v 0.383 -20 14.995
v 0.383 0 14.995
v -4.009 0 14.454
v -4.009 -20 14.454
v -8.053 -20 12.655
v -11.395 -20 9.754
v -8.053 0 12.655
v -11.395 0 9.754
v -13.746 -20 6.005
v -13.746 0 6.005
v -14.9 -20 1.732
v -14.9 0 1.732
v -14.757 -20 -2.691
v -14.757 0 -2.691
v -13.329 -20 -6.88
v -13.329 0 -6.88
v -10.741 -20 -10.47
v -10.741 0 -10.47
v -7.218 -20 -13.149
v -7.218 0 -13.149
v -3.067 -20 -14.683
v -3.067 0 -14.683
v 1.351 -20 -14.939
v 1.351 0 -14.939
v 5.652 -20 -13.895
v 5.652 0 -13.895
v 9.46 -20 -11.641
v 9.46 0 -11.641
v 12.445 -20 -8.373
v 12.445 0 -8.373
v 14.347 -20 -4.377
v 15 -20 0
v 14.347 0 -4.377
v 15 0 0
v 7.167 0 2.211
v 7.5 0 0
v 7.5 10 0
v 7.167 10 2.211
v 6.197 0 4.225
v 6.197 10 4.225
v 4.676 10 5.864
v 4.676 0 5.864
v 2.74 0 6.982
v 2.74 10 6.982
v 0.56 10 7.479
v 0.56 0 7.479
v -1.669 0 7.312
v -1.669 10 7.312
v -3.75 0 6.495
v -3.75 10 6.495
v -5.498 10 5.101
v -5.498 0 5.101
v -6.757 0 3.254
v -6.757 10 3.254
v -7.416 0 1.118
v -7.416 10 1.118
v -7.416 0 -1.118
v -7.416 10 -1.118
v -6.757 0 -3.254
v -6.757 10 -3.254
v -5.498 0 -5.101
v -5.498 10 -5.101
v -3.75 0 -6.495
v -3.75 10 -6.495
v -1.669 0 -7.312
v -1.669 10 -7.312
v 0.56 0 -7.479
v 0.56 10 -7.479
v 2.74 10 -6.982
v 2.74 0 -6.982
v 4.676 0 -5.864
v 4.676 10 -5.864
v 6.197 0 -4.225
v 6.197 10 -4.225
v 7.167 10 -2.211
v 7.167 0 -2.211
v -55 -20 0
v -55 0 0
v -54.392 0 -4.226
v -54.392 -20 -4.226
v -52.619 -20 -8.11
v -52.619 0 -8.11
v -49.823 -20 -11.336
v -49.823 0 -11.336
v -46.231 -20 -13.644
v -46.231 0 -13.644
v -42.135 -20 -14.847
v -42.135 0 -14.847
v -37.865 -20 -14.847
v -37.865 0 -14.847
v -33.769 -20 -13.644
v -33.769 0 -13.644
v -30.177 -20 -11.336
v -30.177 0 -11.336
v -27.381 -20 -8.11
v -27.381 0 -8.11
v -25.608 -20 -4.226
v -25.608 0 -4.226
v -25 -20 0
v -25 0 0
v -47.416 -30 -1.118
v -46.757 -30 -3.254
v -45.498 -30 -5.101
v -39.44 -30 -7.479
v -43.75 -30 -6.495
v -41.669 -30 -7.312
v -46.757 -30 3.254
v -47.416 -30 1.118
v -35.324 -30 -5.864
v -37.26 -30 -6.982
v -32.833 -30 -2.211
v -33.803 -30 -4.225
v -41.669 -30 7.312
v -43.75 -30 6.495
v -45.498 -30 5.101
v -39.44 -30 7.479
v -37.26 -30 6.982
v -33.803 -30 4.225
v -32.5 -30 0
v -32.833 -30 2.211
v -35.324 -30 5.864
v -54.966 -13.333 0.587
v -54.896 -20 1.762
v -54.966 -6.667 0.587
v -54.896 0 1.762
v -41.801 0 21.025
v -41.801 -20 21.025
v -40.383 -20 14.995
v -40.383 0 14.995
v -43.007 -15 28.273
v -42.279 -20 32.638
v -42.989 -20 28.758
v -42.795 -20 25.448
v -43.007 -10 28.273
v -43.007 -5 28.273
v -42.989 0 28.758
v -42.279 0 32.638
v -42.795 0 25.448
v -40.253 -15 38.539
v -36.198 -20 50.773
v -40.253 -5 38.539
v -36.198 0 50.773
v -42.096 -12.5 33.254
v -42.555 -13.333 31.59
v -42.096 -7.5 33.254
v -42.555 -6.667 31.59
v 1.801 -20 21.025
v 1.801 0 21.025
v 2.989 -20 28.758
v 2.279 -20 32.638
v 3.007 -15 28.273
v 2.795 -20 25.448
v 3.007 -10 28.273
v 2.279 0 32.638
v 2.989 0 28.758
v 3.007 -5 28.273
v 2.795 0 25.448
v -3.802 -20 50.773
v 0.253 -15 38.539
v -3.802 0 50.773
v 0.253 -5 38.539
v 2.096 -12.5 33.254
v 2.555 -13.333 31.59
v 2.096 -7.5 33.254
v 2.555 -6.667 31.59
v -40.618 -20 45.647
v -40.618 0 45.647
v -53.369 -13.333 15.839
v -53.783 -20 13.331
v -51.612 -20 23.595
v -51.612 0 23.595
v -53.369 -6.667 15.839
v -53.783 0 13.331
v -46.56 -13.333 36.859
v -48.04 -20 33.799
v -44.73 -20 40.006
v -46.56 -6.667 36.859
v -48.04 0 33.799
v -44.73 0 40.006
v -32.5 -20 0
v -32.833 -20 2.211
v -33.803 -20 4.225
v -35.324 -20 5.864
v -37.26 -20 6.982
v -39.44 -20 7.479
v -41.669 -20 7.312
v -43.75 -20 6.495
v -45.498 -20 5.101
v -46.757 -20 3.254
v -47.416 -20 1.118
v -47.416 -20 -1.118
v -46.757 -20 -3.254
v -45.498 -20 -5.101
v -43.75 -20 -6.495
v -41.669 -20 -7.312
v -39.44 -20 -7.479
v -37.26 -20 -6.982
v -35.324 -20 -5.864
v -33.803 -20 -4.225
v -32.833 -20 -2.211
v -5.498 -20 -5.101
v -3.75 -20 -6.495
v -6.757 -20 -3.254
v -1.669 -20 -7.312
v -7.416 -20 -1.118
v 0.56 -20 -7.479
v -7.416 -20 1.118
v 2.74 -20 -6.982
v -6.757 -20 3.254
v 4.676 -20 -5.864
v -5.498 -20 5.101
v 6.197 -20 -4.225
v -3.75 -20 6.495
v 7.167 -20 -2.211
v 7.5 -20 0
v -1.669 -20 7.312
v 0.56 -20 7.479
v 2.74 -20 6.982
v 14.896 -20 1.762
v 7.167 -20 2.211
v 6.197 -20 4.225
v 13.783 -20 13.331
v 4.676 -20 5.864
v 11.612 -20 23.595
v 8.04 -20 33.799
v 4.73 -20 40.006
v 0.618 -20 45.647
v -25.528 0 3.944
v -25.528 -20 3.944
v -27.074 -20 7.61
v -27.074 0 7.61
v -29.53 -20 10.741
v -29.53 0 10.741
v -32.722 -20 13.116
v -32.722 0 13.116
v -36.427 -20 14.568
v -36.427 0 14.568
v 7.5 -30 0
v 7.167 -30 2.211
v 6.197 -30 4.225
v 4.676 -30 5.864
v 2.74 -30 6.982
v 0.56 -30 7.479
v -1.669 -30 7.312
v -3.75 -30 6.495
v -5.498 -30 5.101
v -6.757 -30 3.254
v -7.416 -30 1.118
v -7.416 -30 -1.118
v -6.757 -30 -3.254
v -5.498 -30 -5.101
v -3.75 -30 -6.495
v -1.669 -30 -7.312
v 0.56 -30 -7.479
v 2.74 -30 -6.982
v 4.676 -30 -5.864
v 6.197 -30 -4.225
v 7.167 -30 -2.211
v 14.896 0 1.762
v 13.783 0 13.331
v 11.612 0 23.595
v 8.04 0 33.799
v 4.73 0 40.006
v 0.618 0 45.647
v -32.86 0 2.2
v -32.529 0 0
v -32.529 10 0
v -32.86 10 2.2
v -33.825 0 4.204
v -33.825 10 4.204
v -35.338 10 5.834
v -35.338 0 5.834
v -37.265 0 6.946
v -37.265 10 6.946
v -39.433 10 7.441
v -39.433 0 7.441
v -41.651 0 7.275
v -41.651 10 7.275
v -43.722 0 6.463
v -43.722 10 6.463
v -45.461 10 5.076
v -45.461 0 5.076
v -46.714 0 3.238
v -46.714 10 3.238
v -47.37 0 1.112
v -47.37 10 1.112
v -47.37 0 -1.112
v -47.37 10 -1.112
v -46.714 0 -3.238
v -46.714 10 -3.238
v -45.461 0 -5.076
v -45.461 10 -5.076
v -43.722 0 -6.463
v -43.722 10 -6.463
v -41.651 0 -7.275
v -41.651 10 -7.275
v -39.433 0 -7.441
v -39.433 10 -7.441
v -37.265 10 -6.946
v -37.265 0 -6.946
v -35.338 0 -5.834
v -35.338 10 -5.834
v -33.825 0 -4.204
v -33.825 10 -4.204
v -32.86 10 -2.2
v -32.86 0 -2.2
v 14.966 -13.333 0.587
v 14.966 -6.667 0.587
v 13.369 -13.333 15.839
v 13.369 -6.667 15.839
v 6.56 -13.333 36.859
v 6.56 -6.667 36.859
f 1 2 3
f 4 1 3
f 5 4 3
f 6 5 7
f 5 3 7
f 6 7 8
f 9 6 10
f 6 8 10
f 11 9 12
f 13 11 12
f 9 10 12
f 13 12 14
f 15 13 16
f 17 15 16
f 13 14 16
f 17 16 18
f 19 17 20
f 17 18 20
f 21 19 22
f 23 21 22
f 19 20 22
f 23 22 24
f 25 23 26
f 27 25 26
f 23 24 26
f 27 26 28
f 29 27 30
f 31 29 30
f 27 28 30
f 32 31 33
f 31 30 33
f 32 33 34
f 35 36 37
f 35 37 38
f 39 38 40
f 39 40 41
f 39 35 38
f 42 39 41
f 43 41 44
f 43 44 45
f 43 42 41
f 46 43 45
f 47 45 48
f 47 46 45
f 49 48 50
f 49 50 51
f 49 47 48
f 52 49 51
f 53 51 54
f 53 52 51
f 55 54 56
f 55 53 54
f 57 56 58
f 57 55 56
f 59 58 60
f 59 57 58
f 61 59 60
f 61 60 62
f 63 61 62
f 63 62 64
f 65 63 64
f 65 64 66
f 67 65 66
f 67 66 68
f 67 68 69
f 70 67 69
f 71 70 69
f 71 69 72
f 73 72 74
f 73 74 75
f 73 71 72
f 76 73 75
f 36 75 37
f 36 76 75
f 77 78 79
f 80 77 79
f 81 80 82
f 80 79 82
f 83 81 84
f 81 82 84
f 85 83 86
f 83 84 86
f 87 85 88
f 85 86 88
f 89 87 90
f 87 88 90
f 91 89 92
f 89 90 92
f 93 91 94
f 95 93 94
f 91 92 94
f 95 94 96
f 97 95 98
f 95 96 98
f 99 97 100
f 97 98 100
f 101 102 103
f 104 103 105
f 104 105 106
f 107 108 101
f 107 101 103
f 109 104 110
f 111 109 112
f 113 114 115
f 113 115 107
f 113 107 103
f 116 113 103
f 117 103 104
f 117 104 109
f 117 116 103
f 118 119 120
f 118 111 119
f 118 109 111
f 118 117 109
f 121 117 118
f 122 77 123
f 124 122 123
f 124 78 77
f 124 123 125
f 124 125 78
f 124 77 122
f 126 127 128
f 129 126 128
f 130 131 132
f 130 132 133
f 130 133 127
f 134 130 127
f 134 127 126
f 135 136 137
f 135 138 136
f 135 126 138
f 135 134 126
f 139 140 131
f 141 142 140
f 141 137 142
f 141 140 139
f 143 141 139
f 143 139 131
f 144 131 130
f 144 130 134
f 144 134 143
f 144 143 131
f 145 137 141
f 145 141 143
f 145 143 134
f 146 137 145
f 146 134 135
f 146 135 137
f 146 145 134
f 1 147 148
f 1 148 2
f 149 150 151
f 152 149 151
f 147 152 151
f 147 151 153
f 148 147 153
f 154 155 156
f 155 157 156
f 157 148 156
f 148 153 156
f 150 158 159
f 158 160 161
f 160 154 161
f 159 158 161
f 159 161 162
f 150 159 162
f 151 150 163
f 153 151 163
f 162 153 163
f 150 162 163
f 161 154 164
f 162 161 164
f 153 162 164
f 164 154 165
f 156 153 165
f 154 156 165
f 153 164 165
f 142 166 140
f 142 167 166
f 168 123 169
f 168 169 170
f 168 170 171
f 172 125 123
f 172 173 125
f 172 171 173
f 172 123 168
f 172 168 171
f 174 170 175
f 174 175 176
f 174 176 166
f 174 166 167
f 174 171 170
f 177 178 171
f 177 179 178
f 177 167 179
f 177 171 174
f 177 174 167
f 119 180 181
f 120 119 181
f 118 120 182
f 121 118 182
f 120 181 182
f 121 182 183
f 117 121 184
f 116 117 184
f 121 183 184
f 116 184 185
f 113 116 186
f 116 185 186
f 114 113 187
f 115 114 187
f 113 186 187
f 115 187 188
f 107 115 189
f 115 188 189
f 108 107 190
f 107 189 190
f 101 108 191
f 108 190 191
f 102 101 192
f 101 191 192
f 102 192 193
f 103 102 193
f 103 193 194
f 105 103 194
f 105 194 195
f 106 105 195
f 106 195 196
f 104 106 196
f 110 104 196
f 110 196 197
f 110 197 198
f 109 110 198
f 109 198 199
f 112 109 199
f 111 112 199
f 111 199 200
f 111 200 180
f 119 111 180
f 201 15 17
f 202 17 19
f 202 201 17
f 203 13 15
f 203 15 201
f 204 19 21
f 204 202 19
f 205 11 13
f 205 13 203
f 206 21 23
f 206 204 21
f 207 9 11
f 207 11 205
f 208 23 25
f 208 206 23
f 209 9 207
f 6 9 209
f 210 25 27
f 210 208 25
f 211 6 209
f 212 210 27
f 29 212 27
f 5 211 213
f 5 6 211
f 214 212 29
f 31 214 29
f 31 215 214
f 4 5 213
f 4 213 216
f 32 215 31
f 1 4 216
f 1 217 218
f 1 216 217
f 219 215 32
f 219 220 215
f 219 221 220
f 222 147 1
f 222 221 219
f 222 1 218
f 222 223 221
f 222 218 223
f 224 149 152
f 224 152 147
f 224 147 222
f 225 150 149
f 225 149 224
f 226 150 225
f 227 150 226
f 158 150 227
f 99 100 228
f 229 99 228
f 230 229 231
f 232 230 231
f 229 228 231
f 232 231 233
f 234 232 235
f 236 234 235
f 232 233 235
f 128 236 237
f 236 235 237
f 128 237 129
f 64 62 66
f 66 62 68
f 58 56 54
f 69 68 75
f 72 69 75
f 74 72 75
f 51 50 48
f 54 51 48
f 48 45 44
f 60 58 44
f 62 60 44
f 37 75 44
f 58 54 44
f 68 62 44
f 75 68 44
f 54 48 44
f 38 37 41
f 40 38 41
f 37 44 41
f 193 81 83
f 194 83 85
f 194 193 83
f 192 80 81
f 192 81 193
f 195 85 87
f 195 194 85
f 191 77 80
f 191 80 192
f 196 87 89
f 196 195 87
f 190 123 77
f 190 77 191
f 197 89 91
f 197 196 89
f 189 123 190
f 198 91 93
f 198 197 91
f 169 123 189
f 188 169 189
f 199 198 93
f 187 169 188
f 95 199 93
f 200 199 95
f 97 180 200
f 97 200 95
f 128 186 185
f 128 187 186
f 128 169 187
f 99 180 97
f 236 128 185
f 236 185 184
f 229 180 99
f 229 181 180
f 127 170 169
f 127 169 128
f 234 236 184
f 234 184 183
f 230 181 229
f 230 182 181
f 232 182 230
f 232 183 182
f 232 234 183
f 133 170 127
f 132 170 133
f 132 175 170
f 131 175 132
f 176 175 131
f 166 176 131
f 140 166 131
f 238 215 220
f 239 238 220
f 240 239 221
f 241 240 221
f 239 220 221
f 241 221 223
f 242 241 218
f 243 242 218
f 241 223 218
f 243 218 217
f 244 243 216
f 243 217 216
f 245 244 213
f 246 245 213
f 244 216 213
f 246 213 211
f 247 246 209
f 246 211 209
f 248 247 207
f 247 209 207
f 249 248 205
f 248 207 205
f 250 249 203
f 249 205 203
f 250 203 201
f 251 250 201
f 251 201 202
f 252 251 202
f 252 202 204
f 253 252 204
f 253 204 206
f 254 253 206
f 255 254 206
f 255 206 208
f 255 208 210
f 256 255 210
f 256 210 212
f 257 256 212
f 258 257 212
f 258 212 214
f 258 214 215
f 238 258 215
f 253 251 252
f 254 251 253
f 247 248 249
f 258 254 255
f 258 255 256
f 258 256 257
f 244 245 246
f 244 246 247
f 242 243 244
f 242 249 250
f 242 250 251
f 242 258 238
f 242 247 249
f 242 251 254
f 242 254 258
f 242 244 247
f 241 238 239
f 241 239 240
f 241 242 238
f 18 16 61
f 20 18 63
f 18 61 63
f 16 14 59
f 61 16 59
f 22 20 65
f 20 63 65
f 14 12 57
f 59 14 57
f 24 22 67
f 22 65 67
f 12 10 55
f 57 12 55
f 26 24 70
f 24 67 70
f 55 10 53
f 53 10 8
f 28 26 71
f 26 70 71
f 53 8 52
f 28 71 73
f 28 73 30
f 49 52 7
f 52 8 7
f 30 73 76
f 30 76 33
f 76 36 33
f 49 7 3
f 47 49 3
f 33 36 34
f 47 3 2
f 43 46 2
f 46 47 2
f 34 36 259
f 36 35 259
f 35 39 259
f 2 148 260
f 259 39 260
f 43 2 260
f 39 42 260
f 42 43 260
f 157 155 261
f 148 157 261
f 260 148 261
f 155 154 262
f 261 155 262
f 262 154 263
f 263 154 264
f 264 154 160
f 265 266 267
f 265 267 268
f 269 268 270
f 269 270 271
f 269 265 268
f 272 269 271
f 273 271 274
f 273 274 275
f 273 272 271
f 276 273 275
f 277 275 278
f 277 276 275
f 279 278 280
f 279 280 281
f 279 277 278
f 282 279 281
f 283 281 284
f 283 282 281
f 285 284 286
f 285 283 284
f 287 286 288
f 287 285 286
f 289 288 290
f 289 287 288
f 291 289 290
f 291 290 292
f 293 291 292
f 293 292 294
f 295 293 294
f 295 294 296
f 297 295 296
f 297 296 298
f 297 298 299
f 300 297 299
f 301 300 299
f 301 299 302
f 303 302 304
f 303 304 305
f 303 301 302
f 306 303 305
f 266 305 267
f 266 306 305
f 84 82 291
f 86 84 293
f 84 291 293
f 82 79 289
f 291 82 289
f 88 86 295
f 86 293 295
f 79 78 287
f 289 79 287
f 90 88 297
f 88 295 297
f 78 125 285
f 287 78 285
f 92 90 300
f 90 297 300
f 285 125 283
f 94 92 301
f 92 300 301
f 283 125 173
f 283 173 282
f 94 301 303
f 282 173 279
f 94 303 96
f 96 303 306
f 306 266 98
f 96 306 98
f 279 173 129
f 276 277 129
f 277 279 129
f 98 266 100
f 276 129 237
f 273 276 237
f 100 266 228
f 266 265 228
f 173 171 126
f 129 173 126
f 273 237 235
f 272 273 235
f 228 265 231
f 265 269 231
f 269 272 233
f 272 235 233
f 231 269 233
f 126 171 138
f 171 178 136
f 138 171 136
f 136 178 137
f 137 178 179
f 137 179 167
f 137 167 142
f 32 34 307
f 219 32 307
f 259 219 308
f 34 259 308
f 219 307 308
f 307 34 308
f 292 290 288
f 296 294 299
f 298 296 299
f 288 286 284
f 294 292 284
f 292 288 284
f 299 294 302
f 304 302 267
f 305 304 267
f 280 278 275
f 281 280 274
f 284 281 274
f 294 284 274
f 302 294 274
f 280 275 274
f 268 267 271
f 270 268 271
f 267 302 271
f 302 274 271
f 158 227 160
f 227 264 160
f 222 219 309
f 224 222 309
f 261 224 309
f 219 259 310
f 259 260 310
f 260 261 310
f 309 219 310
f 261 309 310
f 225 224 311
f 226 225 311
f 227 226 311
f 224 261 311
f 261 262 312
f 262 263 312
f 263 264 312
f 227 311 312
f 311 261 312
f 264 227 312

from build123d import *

# Parameters (mm, degrees)
F0_R          = 7.5
F1_DEPTH      = 20
F3_DEPTH      = 30
F2_R          = 7.4623374199
F4_DEPTH      = 25
F4_DEPTH_BACK = 10
F5_DEPTH      = 30
F6_DEPTH      = 25
F6_DEPTH_BACK = 10


with BuildPart() as f1:
    # F0 (on Front) → F1 (new body)
    with BuildSketch(Plane.XZ):
        with BuildLine():
            ThreePointArc((-54.8961763386, 1.7617975164), (-50.1065741182, 11.0840948929), (-40.3829191544, 14.9951116342))
            add(Edge.make_bspline(
                [(-36.1976698041, 50.7730282843), (-37.7009093441, 46.1154933355), (-40.4381626311, 37.6342591201), (-44.0181723105, 28.6082070233), (-41.4534466343, 20.0703507947), (-40.7085925845, 16.5444741892), (-40.3829191544, 14.9951116342)],
                knots=[0, 0, 0, 0, 0.3125389838, 0.5693061929, 0.8113231168, 1, 1, 1, 1], degree=3))
            add(Edge.make_bspline(
                [(-54.8961763386, 1.7617975164), (-54.6289154177, 6.200226793), (-53.8445133009, 16.72844038), (-47.8365264853, 37.6549899489), (-39.9178996464, 46.5799946364), (-36.1976698041, 50.7730282843)],
                knots=[0.0363153169, 0.0363153169, 0.0363153169, 0.0363153169, 0.3103841732, 0.6760133505, 1, 1, 1, 1], degree=3))
        make_face()
        with BuildLine():
            ThreePointArc((-55, 0), (-40, -15), (-25, 0))
            ThreePointArc((-25, 0), (-29.5296558632, 10.7411309301), (-40.3829191544, 14.9951116342))
            ThreePointArc((-40.3829191544, 14.9951116342), (-50.1065741182, 11.0840948929), (-54.8961763386, 1.7617975164))
            add(Edge.make_bspline(
                [(-55, 0), (-54.9657947872, 0.5868431554), (-54.9315895744, 1.1736863108), (-54.8961763386, 1.7617975164)],
                knots=[0, 0, 0, 0, 0.0363153169, 0.0363153169, 0.0363153169, 0.0363153169], degree=3))
        make_face()
        with Locations((-40, 0)):
            Circle(F0_R, mode=Mode.SUBTRACT)
    extrude(amount=F1_DEPTH)

    # F0 (on Front) → F3 (join)
    with BuildSketch(Plane.XZ):
        with Locations((-40, 0)):
            Circle(F0_R)
    extrude(amount=F3_DEPTH)

    # F2 (on Front) → F4 (join, two sides)
    with BuildSketch(Plane.XZ) as f4_sk:
        with Locations((-39.9908795953, 0)):
            Circle(F2_R)
    extrude(amount=F4_DEPTH)
    extrude(f4_sk.sketch, amount=-F4_DEPTH_BACK)


with BuildPart() as f1b:
    # F0 (on Front) → F1, piece 2 (new body)
    with BuildSketch(Plane.XZ):
        with BuildLine():
            ThreePointArc((14.8961763386, 1.7617975164), (10.1065741182, 11.0840948929), (0.3829191544, 14.9951116342))
            ThreePointArc((0.3829191544, 14.9951116342), (-10.7411309301, -10.4703441368), (15, 0))
            add(Edge.make_bspline(
                [(15, 0), (14.9657947872, 0.5868431554), (14.9315895744, 1.1736863108), (14.8961763386, 1.7617975164)],
                knots=[0, 0, 0, 0, 0.0363153169, 0.0363153169, 0.0363153169, 0.0363153169], degree=3))
        make_face()
        Circle(F0_R, mode=Mode.SUBTRACT)
        with BuildLine():
            add(Edge.make_bspline(
                [(-3.8023301959, 50.7730282843), (-2.2990906559, 46.1154933355), (0.4381626311, 37.6342591201), (4.0181723105, 28.6082070233), (1.4534466343, 20.0703507947), (0.7085925845, 16.5444741892), (0.3829191544, 14.9951116342)],
                knots=[0, 0, 0, 0, 0.3125389838, 0.5693061929, 0.8113231168, 1, 1, 1, 1], degree=3))
            ThreePointArc((0.3829191544, 14.9951116342), (10.1065741182, 11.0840948929), (14.8961763386, 1.7617975164))
            add(Edge.make_bspline(
                [(14.8961763386, 1.7617975164), (14.6289154177, 6.200226793), (13.8445133009, 16.72844038), (7.8365264853, 37.6549899489), (-0.0821003536, 46.5799946364), (-3.8023301959, 50.7730282843)],
                knots=[0.0363153169, 0.0363153169, 0.0363153169, 0.0363153169, 0.3103841732, 0.6760133505, 1, 1, 1, 1], degree=3))
        make_face()
    extrude(amount=F1_DEPTH)

    # F0 (on Front) → F5 (join)
    with BuildSketch(Plane.XZ):
        Circle(F0_R)
    extrude(amount=F5_DEPTH)

    # F0 (on Front) → F6 (join, two sides)
    with BuildSketch(Plane.XZ) as f6_sk:
        Circle(F0_R)
    extrude(amount=F6_DEPTH)
    extrude(f6_sk.sketch, amount=-F6_DEPTH_BACK)


solid = Compound([f1.part, f1b.part])
